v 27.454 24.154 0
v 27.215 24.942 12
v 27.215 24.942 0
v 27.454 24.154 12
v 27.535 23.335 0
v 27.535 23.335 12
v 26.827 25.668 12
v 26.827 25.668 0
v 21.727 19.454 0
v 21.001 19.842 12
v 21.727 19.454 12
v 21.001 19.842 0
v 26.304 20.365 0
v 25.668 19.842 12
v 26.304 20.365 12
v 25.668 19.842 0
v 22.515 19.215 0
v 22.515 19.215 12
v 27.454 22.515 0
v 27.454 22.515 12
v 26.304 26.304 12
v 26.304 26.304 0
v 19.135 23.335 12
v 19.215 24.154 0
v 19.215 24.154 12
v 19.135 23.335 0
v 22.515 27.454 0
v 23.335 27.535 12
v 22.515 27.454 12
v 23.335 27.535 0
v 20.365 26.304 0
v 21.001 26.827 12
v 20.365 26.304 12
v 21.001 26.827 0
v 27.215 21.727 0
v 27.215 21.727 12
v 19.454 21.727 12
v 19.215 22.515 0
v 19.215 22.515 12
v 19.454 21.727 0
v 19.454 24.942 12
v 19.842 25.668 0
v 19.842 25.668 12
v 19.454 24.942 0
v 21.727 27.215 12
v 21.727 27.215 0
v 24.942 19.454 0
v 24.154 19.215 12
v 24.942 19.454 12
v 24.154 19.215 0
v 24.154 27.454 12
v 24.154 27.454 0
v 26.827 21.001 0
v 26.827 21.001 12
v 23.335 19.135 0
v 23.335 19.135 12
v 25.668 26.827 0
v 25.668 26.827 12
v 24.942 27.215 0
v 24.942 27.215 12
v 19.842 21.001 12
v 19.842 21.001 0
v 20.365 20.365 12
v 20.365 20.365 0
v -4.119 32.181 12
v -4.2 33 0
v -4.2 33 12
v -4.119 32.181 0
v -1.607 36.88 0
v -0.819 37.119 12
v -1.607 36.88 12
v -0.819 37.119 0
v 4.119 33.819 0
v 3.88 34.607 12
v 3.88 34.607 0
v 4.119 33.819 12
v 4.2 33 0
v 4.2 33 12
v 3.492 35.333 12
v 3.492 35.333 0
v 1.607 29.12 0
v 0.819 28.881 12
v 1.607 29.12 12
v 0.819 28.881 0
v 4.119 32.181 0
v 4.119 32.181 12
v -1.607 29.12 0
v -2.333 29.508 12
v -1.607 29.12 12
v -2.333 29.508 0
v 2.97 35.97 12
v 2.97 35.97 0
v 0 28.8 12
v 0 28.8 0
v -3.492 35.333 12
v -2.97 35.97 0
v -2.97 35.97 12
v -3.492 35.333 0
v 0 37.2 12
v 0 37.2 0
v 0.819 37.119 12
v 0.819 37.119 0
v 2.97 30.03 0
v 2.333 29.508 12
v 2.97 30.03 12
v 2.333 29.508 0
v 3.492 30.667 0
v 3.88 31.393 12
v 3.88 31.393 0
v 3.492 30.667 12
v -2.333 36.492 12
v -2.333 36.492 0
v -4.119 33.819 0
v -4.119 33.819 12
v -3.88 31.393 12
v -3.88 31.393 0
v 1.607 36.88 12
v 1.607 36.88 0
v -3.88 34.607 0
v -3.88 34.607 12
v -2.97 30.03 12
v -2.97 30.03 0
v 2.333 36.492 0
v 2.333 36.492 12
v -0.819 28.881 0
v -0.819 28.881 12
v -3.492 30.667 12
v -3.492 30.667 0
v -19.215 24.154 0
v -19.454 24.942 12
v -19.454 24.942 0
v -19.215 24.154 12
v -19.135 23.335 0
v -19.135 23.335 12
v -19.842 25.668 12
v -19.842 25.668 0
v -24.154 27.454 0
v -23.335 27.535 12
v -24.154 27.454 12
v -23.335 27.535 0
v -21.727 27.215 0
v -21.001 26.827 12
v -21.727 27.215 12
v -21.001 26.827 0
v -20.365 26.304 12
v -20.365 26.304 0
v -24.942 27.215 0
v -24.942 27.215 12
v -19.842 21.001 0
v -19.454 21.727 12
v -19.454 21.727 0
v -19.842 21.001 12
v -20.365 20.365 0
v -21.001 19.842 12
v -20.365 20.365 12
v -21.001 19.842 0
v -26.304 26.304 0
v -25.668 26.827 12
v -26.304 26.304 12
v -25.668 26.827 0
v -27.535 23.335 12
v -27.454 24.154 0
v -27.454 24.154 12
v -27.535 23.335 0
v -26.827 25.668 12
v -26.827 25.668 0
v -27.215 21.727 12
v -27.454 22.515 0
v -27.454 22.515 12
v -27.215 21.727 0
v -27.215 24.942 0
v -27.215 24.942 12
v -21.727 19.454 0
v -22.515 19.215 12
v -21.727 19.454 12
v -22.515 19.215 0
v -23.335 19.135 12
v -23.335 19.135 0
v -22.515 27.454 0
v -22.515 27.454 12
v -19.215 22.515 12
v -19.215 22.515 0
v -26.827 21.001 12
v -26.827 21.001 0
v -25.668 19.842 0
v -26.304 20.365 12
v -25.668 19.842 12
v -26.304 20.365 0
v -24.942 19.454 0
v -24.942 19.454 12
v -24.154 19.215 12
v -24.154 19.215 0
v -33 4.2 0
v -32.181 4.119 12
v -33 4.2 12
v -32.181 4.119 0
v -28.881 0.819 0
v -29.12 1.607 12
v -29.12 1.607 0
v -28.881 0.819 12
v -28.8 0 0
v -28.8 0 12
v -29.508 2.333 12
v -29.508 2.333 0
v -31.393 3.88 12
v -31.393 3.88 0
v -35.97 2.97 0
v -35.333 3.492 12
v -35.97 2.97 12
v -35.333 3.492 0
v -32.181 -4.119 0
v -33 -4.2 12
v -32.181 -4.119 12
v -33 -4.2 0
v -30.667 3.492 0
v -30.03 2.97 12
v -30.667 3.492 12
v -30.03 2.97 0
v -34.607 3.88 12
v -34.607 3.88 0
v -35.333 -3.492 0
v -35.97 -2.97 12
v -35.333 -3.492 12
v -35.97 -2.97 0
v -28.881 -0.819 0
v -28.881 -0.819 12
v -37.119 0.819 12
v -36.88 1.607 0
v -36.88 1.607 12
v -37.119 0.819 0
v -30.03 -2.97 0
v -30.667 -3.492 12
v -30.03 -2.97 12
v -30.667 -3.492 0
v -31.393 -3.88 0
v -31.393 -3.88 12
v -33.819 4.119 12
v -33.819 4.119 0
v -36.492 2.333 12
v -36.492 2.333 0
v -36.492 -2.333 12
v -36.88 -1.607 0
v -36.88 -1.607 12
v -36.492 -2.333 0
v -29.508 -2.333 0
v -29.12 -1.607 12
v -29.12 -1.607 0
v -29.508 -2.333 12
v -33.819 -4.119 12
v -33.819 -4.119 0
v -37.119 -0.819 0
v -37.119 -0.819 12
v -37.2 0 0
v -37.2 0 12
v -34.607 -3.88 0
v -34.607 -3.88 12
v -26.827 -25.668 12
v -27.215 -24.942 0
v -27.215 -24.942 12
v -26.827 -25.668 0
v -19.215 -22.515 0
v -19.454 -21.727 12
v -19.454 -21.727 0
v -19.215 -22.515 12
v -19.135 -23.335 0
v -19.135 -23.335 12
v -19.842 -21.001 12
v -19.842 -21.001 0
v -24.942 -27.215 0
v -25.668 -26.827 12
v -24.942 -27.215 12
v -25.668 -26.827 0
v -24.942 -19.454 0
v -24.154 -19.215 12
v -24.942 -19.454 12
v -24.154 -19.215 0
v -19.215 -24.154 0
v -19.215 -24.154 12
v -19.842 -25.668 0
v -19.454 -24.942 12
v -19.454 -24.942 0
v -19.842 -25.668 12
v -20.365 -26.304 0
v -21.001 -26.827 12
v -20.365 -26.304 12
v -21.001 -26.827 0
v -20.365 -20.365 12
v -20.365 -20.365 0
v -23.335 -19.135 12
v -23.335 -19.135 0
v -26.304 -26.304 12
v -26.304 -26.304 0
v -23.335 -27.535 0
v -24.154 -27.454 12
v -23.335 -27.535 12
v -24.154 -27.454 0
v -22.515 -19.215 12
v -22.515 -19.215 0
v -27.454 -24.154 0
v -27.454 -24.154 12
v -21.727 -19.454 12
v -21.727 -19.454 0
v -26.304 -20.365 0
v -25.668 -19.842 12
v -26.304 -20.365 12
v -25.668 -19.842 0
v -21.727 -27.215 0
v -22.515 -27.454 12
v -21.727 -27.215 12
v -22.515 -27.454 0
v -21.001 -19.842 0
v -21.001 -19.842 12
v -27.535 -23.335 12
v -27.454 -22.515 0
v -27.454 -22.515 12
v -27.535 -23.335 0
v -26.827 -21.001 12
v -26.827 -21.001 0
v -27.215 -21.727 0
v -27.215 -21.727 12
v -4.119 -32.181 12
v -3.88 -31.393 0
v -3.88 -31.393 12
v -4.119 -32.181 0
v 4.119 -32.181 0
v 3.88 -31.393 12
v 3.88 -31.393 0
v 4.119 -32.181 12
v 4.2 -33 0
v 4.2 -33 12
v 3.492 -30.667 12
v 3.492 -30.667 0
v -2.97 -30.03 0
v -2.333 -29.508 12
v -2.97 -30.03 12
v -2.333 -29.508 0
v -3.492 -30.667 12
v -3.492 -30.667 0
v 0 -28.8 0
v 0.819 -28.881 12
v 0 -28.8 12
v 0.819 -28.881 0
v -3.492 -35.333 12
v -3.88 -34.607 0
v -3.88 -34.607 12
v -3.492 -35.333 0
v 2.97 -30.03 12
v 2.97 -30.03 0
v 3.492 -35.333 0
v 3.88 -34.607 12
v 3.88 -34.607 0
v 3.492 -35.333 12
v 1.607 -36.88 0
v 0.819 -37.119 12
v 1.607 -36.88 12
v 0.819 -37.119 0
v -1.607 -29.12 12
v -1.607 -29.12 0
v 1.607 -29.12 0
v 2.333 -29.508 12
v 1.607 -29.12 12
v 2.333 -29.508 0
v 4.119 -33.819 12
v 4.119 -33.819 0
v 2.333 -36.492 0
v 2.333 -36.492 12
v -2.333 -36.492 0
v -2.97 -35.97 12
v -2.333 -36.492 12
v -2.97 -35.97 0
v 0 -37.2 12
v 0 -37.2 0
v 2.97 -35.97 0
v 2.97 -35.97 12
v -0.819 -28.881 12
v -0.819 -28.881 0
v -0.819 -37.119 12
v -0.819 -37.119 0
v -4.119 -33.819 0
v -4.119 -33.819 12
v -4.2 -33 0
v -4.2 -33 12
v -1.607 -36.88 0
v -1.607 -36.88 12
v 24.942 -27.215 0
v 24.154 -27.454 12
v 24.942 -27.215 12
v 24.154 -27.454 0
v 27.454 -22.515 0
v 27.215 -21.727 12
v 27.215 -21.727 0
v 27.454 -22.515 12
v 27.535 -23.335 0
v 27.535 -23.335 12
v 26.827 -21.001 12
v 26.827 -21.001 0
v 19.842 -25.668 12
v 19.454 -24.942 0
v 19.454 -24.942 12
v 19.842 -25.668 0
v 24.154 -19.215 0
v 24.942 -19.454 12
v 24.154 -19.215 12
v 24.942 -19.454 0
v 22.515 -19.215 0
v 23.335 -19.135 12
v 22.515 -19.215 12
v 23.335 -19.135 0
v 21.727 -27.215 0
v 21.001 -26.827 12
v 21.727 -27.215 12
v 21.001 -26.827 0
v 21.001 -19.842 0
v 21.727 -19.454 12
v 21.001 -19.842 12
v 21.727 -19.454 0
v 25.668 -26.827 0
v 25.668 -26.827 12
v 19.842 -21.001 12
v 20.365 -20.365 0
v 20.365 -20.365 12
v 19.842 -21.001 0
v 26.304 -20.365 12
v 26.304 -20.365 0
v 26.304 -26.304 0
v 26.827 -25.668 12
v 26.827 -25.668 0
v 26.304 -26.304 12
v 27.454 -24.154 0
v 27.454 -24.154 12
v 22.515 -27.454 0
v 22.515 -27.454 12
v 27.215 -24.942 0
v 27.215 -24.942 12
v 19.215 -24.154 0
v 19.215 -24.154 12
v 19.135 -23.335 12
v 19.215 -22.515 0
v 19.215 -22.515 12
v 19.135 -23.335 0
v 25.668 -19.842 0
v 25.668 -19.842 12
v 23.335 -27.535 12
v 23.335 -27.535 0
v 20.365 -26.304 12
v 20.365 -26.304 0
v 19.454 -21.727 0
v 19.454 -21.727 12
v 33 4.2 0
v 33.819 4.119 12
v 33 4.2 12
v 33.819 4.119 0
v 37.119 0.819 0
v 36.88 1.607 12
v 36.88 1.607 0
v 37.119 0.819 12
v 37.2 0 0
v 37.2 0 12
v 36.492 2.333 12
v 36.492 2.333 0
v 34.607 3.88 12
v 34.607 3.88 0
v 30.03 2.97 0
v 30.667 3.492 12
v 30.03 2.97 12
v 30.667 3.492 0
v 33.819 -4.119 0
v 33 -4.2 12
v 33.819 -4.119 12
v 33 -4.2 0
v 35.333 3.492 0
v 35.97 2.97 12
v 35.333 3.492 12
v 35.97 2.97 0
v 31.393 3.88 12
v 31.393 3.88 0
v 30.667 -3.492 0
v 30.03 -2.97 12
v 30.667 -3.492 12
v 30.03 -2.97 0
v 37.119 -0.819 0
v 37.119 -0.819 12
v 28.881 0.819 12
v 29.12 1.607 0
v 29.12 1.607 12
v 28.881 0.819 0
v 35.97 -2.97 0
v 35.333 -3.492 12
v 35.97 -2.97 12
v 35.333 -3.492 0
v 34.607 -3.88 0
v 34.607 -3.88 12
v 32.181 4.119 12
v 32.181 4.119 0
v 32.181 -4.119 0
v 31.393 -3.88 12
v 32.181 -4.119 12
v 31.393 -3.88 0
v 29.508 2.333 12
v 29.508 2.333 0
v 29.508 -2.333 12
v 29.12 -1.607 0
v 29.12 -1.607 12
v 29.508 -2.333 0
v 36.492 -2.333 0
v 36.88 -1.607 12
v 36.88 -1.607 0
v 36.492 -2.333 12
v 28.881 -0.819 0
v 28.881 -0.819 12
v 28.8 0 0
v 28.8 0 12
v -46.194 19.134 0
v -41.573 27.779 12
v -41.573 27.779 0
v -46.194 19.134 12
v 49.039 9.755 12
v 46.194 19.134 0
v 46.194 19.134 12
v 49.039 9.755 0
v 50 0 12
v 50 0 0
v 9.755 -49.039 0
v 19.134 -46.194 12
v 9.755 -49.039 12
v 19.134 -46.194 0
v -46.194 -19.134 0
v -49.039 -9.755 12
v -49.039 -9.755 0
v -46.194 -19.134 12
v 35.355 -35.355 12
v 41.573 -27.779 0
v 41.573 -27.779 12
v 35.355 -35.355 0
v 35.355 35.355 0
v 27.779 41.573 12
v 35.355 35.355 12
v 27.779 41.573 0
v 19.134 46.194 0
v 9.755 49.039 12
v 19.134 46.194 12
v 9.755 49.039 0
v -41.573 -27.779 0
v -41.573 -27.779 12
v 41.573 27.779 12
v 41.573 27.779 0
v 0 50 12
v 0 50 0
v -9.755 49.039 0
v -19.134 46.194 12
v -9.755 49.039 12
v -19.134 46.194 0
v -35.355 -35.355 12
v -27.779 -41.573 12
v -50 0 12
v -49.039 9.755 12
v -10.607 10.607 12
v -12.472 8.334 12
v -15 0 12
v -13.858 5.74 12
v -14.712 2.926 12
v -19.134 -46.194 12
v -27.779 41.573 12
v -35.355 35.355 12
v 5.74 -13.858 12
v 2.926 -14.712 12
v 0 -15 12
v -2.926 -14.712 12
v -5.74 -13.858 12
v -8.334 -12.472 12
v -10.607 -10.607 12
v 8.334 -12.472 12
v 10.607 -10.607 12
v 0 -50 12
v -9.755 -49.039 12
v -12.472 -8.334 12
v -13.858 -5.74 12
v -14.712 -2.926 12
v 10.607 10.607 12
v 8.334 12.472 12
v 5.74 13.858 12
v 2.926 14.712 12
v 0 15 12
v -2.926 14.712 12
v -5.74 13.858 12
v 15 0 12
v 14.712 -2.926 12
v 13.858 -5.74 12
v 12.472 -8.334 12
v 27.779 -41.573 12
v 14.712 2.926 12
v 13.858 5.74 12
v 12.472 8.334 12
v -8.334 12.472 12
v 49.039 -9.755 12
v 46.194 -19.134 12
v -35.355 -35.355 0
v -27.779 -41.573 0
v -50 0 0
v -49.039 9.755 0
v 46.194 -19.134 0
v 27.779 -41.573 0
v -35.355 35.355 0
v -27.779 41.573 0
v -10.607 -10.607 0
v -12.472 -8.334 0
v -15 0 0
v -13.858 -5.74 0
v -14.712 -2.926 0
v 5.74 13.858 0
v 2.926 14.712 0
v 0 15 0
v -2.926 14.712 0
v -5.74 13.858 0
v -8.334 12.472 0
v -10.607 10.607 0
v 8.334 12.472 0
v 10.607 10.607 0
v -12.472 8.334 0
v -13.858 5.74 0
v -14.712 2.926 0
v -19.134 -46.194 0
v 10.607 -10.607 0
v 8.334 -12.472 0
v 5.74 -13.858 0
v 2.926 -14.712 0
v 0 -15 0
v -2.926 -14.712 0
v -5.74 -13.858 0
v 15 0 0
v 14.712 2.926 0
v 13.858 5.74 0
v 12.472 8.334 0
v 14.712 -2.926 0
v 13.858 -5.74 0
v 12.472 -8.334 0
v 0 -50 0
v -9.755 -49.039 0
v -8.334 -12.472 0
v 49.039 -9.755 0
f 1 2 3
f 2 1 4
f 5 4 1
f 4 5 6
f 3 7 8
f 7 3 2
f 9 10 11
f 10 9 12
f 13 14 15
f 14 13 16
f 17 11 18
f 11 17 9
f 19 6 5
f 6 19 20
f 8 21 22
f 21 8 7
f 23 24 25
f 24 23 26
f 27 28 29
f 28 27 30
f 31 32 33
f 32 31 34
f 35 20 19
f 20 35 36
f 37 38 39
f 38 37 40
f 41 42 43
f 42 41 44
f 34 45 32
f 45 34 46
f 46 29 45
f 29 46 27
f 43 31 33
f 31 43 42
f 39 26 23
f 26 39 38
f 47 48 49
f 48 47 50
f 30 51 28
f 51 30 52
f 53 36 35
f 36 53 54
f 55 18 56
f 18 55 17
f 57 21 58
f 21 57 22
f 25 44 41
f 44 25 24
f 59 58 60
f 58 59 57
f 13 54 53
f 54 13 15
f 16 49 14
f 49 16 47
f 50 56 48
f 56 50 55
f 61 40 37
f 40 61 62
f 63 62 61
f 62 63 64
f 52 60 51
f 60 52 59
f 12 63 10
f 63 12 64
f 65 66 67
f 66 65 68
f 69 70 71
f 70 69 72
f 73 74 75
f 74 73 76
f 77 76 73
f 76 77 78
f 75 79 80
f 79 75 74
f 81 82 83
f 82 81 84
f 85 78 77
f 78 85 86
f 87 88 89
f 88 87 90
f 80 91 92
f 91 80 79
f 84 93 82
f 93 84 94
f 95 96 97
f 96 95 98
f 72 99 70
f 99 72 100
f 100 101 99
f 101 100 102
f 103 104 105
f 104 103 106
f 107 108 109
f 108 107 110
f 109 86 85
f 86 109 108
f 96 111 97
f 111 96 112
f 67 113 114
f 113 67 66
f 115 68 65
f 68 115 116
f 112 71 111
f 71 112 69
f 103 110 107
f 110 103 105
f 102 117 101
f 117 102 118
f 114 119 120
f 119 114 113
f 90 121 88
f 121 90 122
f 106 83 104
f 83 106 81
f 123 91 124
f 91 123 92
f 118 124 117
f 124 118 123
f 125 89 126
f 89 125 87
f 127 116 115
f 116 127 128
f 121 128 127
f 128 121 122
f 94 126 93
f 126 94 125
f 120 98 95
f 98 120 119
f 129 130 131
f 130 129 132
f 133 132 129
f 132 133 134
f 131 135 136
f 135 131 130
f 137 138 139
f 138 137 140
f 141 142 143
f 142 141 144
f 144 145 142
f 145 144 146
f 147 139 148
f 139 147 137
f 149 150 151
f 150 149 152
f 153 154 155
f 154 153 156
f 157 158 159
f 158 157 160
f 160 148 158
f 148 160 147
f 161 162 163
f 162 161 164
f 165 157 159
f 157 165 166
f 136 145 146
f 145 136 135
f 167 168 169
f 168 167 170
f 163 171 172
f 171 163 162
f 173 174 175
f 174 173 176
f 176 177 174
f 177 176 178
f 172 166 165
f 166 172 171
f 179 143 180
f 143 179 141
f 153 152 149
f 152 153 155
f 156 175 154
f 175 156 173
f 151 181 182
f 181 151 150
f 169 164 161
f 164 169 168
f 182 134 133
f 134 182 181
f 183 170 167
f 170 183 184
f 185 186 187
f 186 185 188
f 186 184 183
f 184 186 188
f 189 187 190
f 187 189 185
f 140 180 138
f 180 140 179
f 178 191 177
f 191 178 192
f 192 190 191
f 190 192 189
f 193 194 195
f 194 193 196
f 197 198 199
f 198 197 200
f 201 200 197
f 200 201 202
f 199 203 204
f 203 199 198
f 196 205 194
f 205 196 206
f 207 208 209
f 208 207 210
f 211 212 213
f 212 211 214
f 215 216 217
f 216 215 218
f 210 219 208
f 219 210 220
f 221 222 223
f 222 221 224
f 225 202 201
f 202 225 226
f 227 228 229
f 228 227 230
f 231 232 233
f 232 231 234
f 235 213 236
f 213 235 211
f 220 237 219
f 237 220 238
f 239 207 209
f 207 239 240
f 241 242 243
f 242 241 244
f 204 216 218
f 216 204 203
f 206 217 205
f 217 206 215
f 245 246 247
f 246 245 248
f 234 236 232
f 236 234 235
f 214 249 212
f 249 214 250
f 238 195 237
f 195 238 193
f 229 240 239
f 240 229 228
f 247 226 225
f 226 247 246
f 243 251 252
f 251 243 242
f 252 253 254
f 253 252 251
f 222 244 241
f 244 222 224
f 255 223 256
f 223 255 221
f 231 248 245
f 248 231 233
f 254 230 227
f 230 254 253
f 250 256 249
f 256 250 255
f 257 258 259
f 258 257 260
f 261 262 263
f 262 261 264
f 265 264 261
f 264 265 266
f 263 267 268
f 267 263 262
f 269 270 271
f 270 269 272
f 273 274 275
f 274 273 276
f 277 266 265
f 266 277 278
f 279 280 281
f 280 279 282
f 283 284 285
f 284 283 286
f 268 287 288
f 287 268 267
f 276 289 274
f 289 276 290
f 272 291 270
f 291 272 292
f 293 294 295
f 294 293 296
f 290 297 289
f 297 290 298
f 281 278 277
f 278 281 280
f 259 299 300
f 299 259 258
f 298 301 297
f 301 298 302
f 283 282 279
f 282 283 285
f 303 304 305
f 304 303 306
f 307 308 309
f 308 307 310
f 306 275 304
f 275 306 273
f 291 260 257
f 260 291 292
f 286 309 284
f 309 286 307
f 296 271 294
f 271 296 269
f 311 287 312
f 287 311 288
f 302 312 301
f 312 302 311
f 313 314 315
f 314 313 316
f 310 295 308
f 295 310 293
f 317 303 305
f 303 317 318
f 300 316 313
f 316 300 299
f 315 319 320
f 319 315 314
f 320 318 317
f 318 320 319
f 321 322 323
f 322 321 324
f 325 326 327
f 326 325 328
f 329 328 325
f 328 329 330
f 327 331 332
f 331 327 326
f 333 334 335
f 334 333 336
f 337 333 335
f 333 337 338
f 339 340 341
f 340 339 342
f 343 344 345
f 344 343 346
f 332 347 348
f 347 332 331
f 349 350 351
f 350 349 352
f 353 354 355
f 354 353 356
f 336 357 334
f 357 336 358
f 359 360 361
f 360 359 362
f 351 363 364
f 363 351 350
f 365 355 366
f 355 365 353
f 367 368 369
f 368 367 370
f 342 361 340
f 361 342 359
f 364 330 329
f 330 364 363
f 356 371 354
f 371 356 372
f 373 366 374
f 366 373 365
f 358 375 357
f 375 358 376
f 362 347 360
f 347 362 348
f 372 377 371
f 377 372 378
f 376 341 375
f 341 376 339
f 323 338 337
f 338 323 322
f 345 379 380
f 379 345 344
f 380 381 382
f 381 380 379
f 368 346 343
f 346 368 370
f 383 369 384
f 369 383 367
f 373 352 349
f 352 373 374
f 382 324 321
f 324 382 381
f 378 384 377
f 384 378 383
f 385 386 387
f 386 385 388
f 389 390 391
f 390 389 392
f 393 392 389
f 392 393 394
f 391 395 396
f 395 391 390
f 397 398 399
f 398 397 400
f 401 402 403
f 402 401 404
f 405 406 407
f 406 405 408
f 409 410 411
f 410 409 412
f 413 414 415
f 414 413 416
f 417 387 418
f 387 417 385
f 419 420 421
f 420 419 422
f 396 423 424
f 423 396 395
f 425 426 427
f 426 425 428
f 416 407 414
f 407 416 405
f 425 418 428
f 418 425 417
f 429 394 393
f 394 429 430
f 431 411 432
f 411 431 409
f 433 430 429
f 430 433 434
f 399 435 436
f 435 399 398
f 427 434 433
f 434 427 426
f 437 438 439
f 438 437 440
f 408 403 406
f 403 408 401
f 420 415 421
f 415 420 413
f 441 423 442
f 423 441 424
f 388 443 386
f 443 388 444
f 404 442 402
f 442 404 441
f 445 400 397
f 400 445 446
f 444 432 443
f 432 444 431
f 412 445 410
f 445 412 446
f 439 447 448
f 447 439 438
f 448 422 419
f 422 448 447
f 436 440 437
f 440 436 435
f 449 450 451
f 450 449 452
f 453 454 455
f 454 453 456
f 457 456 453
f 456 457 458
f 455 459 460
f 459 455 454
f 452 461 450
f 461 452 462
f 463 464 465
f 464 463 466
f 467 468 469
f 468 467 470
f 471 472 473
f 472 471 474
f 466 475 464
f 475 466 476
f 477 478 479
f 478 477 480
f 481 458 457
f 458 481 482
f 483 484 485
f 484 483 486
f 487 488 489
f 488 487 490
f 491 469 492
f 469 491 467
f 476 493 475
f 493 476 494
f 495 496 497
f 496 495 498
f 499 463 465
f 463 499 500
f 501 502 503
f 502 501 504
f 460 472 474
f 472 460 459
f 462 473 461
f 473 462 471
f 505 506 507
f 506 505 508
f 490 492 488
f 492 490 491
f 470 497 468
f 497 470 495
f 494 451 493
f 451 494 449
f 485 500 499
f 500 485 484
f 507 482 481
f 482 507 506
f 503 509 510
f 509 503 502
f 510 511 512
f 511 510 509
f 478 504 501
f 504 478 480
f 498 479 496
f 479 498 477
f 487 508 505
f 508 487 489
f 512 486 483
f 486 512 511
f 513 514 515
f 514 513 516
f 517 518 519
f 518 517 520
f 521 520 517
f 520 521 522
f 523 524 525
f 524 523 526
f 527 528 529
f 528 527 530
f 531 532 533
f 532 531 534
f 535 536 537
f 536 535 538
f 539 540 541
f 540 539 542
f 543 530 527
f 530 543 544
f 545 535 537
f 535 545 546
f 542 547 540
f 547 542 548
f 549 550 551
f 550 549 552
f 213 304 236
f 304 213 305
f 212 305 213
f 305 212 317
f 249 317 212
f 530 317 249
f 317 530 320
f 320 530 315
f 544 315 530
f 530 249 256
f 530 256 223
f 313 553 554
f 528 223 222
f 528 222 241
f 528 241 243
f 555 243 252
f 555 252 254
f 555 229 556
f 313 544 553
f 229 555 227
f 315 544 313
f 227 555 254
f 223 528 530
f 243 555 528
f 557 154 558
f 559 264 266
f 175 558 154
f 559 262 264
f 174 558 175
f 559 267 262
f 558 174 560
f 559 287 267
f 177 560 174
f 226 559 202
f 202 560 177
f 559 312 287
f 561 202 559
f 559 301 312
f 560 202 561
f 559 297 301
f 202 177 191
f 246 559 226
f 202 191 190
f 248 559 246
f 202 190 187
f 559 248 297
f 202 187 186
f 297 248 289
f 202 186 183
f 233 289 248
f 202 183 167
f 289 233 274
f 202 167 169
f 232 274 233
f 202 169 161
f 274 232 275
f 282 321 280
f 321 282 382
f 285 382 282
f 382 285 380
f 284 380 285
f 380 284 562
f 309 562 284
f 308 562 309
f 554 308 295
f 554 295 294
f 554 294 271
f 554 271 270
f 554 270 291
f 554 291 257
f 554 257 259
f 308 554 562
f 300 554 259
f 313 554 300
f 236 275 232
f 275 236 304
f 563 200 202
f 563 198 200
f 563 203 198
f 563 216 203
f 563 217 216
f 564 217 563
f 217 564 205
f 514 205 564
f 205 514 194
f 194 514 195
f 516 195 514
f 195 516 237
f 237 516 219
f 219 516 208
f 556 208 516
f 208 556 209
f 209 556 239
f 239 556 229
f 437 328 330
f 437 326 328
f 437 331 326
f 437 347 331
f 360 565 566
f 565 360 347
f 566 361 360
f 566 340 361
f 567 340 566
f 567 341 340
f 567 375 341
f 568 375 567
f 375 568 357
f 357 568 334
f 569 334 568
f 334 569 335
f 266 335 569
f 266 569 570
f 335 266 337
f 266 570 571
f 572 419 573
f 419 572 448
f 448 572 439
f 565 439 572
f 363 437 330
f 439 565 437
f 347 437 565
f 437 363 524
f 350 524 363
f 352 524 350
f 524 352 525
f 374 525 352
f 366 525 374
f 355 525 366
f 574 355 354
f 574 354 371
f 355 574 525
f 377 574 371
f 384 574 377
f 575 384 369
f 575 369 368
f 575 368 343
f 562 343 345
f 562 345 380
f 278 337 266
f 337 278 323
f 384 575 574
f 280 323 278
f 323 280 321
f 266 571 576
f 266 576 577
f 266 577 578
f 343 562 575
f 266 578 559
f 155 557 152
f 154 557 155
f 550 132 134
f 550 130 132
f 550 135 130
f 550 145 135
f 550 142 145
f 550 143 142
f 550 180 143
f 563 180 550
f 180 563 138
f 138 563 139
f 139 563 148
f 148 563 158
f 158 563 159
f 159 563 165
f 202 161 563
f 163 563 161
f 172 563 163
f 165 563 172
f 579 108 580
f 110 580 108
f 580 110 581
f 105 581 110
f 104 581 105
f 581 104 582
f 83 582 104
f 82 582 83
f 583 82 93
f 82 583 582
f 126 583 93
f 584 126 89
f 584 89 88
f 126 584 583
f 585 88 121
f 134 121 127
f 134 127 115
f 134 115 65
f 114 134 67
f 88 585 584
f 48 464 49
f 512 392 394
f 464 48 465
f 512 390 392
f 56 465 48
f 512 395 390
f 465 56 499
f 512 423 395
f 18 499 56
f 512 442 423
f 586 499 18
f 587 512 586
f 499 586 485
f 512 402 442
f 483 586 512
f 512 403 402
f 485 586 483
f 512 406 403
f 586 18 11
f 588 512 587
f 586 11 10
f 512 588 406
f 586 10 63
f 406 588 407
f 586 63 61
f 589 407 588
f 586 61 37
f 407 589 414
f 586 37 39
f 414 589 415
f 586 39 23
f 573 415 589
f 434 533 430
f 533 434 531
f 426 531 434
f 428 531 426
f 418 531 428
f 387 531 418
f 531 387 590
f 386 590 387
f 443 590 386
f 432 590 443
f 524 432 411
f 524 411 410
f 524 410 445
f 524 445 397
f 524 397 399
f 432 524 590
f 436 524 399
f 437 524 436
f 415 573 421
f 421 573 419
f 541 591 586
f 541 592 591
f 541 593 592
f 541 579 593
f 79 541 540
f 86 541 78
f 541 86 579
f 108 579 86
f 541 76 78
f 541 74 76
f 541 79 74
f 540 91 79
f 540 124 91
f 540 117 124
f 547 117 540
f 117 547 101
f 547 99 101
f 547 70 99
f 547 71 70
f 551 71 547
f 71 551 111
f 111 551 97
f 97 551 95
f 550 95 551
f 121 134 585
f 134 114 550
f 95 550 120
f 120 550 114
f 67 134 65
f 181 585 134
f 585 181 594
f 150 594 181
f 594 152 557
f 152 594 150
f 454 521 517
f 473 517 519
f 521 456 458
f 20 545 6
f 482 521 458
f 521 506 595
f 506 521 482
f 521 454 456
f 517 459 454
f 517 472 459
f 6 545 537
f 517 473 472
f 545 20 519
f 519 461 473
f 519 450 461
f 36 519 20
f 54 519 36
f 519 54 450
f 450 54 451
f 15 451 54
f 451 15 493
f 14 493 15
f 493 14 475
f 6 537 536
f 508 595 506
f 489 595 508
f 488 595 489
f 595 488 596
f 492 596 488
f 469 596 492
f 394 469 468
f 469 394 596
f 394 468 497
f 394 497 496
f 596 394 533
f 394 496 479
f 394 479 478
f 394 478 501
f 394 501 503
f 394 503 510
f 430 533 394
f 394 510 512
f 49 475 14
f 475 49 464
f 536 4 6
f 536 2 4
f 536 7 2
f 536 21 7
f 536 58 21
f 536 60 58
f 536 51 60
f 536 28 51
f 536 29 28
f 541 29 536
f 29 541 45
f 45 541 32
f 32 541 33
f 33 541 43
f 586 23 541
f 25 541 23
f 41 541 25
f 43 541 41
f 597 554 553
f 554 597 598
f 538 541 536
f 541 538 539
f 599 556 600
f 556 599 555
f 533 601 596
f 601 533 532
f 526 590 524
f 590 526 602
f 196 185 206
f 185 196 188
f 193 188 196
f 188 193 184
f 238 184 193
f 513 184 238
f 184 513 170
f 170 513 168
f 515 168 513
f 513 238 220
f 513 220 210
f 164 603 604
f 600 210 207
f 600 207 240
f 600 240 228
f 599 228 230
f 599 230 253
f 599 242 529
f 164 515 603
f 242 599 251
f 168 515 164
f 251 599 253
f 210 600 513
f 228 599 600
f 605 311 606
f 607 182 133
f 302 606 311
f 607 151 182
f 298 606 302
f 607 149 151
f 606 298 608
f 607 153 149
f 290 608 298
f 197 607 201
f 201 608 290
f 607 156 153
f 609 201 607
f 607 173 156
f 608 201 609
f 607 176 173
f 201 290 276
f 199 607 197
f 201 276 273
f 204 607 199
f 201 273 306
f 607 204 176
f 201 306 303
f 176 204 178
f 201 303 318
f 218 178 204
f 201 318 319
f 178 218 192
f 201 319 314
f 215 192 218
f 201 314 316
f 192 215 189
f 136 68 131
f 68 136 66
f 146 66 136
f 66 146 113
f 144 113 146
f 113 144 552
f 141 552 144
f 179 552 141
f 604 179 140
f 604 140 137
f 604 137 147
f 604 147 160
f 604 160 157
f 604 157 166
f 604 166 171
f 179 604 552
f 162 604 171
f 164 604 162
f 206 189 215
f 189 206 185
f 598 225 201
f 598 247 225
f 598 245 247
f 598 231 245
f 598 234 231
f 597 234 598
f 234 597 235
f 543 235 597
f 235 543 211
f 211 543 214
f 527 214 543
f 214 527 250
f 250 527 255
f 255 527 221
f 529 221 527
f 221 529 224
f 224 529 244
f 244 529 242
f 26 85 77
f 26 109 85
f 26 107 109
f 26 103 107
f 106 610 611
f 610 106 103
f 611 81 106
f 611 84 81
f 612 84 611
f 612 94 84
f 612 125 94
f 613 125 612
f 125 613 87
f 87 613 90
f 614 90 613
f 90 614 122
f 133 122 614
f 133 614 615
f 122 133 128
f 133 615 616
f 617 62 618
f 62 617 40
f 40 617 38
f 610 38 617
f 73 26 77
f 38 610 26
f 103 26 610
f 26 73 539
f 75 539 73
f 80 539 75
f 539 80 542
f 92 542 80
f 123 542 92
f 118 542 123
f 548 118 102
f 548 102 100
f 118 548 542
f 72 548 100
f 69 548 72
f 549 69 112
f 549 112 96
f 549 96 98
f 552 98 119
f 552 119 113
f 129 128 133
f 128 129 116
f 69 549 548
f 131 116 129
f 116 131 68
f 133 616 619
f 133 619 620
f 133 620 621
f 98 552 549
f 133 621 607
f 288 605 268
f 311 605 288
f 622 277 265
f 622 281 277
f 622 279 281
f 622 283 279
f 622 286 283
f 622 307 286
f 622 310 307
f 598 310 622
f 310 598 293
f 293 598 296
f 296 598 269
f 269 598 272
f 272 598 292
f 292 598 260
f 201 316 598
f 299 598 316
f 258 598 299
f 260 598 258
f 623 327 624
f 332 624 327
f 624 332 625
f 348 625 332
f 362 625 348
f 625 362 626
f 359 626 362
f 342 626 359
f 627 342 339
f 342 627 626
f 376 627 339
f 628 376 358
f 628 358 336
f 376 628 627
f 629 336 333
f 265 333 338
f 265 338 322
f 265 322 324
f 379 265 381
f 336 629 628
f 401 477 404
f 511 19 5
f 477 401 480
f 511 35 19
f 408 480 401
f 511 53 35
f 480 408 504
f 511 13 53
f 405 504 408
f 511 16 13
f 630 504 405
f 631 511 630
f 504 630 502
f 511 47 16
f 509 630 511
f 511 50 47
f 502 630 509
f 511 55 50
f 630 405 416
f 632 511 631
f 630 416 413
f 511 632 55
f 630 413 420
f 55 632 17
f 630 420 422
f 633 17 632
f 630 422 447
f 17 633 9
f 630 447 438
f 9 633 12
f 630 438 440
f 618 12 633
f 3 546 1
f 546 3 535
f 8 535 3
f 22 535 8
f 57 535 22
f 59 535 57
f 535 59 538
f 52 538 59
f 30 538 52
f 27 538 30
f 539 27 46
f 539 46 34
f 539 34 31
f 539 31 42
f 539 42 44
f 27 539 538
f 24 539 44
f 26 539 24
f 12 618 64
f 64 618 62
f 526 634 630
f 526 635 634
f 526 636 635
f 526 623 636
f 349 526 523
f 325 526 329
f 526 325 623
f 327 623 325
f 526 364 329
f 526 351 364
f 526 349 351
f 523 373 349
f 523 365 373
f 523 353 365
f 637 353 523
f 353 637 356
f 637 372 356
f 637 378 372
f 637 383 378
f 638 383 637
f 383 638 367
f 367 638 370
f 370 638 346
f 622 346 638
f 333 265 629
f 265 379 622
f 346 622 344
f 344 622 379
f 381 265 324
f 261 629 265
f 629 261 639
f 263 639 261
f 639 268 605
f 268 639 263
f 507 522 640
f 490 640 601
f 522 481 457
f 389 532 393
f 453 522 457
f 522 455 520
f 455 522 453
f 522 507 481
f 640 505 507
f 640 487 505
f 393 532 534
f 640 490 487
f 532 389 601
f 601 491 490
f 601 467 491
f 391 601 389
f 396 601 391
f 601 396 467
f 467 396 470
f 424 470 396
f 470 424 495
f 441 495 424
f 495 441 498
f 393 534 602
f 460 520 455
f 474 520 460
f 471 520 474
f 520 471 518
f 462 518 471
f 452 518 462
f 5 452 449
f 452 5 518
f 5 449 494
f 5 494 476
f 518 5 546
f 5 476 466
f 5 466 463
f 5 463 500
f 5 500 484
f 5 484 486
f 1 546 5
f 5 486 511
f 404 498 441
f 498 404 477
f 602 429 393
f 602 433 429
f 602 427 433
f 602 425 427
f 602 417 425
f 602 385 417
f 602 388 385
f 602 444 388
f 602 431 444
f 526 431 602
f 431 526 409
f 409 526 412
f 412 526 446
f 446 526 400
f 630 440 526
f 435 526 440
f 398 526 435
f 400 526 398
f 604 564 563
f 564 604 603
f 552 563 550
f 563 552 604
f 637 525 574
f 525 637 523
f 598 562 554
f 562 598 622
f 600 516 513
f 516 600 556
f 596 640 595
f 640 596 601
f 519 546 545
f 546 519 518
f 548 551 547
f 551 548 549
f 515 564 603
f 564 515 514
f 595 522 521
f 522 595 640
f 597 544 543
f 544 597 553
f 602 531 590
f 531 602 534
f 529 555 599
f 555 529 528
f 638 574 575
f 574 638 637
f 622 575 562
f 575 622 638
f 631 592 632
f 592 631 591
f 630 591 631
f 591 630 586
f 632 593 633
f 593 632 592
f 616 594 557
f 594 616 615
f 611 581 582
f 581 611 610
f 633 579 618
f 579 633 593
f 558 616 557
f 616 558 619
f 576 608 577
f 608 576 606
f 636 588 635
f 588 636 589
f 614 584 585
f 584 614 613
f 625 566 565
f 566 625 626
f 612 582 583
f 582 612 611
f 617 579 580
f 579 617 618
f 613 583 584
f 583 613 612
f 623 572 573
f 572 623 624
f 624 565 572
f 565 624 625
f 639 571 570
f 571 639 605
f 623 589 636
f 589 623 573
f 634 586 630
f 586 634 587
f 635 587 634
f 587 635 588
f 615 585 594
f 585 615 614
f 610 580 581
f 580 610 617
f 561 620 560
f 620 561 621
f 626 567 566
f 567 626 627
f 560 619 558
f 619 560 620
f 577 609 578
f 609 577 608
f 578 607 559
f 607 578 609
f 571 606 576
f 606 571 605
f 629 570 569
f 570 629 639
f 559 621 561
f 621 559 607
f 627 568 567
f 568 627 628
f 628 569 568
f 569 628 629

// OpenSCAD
$fn = 32;

// ----------------------------------------------------------------------
// Flange Ø100 x 12
// 8 holes on a Ø66 bolt circle, bolted joints
// ----------------------------------------------------------------------

// --- parameters (mm) ---
flange_d = 100;  // outside diameter of the flange
thickness = 12;  // flange thickness
holes = 8;       // number of bolt holes
pcd = 66;        // bolt circle diameter
start_deg = 45;  // angle of the first hole, from +X
hole_d = 8.4;    // bolt hole diameter
bore_d = 30;     // central through bore
hub_d = 38;      // hub outside diameter
hub_h = 0;       // hub height above the flange face (0 = no hub)

// --- derived feature positions (mm) ---
height = thickness + hub_h;  // = 12   overall height of the part
pcd_r = pcd / 2;             // = 33   bolt circle radius
hole_step = 360 / holes;     // = 45   angular pitch
feature_centers = [
  [pcd_r * cos(start_deg + 0 * hole_step), pcd_r * sin(start_deg + 0 * hole_step)],
  [pcd_r * cos(start_deg + 1 * hole_step), pcd_r * sin(start_deg + 1 * hole_step)],
  [pcd_r * cos(start_deg + 2 * hole_step), pcd_r * sin(start_deg + 2 * hole_step)],
  [pcd_r * cos(start_deg + 3 * hole_step), pcd_r * sin(start_deg + 3 * hole_step)],
  [pcd_r * cos(start_deg + 4 * hole_step), pcd_r * sin(start_deg + 4 * hole_step)],
  [pcd_r * cos(start_deg + 5 * hole_step), pcd_r * sin(start_deg + 5 * hole_step)],
  [pcd_r * cos(start_deg + 6 * hole_step), pcd_r * sin(start_deg + 6 * hole_step)],
  [pcd_r * cos(start_deg + 7 * hole_step), pcd_r * sin(start_deg + 7 * hole_step)]
];   // bolt hole centres on the pitch circle

// flange disc, every hole and the bore cut straight through
difference() {
  union() {
    cylinder(d = flange_d, h = thickness);
  }
  translate([0, 0, -1]) cylinder(d = bore_d, h = height + 2);  // bore, through
  for (centre = feature_centers)
    translate([centre[0], centre[1], -1]) cylinder(d = hole_d, h = thickness + 2);
}
